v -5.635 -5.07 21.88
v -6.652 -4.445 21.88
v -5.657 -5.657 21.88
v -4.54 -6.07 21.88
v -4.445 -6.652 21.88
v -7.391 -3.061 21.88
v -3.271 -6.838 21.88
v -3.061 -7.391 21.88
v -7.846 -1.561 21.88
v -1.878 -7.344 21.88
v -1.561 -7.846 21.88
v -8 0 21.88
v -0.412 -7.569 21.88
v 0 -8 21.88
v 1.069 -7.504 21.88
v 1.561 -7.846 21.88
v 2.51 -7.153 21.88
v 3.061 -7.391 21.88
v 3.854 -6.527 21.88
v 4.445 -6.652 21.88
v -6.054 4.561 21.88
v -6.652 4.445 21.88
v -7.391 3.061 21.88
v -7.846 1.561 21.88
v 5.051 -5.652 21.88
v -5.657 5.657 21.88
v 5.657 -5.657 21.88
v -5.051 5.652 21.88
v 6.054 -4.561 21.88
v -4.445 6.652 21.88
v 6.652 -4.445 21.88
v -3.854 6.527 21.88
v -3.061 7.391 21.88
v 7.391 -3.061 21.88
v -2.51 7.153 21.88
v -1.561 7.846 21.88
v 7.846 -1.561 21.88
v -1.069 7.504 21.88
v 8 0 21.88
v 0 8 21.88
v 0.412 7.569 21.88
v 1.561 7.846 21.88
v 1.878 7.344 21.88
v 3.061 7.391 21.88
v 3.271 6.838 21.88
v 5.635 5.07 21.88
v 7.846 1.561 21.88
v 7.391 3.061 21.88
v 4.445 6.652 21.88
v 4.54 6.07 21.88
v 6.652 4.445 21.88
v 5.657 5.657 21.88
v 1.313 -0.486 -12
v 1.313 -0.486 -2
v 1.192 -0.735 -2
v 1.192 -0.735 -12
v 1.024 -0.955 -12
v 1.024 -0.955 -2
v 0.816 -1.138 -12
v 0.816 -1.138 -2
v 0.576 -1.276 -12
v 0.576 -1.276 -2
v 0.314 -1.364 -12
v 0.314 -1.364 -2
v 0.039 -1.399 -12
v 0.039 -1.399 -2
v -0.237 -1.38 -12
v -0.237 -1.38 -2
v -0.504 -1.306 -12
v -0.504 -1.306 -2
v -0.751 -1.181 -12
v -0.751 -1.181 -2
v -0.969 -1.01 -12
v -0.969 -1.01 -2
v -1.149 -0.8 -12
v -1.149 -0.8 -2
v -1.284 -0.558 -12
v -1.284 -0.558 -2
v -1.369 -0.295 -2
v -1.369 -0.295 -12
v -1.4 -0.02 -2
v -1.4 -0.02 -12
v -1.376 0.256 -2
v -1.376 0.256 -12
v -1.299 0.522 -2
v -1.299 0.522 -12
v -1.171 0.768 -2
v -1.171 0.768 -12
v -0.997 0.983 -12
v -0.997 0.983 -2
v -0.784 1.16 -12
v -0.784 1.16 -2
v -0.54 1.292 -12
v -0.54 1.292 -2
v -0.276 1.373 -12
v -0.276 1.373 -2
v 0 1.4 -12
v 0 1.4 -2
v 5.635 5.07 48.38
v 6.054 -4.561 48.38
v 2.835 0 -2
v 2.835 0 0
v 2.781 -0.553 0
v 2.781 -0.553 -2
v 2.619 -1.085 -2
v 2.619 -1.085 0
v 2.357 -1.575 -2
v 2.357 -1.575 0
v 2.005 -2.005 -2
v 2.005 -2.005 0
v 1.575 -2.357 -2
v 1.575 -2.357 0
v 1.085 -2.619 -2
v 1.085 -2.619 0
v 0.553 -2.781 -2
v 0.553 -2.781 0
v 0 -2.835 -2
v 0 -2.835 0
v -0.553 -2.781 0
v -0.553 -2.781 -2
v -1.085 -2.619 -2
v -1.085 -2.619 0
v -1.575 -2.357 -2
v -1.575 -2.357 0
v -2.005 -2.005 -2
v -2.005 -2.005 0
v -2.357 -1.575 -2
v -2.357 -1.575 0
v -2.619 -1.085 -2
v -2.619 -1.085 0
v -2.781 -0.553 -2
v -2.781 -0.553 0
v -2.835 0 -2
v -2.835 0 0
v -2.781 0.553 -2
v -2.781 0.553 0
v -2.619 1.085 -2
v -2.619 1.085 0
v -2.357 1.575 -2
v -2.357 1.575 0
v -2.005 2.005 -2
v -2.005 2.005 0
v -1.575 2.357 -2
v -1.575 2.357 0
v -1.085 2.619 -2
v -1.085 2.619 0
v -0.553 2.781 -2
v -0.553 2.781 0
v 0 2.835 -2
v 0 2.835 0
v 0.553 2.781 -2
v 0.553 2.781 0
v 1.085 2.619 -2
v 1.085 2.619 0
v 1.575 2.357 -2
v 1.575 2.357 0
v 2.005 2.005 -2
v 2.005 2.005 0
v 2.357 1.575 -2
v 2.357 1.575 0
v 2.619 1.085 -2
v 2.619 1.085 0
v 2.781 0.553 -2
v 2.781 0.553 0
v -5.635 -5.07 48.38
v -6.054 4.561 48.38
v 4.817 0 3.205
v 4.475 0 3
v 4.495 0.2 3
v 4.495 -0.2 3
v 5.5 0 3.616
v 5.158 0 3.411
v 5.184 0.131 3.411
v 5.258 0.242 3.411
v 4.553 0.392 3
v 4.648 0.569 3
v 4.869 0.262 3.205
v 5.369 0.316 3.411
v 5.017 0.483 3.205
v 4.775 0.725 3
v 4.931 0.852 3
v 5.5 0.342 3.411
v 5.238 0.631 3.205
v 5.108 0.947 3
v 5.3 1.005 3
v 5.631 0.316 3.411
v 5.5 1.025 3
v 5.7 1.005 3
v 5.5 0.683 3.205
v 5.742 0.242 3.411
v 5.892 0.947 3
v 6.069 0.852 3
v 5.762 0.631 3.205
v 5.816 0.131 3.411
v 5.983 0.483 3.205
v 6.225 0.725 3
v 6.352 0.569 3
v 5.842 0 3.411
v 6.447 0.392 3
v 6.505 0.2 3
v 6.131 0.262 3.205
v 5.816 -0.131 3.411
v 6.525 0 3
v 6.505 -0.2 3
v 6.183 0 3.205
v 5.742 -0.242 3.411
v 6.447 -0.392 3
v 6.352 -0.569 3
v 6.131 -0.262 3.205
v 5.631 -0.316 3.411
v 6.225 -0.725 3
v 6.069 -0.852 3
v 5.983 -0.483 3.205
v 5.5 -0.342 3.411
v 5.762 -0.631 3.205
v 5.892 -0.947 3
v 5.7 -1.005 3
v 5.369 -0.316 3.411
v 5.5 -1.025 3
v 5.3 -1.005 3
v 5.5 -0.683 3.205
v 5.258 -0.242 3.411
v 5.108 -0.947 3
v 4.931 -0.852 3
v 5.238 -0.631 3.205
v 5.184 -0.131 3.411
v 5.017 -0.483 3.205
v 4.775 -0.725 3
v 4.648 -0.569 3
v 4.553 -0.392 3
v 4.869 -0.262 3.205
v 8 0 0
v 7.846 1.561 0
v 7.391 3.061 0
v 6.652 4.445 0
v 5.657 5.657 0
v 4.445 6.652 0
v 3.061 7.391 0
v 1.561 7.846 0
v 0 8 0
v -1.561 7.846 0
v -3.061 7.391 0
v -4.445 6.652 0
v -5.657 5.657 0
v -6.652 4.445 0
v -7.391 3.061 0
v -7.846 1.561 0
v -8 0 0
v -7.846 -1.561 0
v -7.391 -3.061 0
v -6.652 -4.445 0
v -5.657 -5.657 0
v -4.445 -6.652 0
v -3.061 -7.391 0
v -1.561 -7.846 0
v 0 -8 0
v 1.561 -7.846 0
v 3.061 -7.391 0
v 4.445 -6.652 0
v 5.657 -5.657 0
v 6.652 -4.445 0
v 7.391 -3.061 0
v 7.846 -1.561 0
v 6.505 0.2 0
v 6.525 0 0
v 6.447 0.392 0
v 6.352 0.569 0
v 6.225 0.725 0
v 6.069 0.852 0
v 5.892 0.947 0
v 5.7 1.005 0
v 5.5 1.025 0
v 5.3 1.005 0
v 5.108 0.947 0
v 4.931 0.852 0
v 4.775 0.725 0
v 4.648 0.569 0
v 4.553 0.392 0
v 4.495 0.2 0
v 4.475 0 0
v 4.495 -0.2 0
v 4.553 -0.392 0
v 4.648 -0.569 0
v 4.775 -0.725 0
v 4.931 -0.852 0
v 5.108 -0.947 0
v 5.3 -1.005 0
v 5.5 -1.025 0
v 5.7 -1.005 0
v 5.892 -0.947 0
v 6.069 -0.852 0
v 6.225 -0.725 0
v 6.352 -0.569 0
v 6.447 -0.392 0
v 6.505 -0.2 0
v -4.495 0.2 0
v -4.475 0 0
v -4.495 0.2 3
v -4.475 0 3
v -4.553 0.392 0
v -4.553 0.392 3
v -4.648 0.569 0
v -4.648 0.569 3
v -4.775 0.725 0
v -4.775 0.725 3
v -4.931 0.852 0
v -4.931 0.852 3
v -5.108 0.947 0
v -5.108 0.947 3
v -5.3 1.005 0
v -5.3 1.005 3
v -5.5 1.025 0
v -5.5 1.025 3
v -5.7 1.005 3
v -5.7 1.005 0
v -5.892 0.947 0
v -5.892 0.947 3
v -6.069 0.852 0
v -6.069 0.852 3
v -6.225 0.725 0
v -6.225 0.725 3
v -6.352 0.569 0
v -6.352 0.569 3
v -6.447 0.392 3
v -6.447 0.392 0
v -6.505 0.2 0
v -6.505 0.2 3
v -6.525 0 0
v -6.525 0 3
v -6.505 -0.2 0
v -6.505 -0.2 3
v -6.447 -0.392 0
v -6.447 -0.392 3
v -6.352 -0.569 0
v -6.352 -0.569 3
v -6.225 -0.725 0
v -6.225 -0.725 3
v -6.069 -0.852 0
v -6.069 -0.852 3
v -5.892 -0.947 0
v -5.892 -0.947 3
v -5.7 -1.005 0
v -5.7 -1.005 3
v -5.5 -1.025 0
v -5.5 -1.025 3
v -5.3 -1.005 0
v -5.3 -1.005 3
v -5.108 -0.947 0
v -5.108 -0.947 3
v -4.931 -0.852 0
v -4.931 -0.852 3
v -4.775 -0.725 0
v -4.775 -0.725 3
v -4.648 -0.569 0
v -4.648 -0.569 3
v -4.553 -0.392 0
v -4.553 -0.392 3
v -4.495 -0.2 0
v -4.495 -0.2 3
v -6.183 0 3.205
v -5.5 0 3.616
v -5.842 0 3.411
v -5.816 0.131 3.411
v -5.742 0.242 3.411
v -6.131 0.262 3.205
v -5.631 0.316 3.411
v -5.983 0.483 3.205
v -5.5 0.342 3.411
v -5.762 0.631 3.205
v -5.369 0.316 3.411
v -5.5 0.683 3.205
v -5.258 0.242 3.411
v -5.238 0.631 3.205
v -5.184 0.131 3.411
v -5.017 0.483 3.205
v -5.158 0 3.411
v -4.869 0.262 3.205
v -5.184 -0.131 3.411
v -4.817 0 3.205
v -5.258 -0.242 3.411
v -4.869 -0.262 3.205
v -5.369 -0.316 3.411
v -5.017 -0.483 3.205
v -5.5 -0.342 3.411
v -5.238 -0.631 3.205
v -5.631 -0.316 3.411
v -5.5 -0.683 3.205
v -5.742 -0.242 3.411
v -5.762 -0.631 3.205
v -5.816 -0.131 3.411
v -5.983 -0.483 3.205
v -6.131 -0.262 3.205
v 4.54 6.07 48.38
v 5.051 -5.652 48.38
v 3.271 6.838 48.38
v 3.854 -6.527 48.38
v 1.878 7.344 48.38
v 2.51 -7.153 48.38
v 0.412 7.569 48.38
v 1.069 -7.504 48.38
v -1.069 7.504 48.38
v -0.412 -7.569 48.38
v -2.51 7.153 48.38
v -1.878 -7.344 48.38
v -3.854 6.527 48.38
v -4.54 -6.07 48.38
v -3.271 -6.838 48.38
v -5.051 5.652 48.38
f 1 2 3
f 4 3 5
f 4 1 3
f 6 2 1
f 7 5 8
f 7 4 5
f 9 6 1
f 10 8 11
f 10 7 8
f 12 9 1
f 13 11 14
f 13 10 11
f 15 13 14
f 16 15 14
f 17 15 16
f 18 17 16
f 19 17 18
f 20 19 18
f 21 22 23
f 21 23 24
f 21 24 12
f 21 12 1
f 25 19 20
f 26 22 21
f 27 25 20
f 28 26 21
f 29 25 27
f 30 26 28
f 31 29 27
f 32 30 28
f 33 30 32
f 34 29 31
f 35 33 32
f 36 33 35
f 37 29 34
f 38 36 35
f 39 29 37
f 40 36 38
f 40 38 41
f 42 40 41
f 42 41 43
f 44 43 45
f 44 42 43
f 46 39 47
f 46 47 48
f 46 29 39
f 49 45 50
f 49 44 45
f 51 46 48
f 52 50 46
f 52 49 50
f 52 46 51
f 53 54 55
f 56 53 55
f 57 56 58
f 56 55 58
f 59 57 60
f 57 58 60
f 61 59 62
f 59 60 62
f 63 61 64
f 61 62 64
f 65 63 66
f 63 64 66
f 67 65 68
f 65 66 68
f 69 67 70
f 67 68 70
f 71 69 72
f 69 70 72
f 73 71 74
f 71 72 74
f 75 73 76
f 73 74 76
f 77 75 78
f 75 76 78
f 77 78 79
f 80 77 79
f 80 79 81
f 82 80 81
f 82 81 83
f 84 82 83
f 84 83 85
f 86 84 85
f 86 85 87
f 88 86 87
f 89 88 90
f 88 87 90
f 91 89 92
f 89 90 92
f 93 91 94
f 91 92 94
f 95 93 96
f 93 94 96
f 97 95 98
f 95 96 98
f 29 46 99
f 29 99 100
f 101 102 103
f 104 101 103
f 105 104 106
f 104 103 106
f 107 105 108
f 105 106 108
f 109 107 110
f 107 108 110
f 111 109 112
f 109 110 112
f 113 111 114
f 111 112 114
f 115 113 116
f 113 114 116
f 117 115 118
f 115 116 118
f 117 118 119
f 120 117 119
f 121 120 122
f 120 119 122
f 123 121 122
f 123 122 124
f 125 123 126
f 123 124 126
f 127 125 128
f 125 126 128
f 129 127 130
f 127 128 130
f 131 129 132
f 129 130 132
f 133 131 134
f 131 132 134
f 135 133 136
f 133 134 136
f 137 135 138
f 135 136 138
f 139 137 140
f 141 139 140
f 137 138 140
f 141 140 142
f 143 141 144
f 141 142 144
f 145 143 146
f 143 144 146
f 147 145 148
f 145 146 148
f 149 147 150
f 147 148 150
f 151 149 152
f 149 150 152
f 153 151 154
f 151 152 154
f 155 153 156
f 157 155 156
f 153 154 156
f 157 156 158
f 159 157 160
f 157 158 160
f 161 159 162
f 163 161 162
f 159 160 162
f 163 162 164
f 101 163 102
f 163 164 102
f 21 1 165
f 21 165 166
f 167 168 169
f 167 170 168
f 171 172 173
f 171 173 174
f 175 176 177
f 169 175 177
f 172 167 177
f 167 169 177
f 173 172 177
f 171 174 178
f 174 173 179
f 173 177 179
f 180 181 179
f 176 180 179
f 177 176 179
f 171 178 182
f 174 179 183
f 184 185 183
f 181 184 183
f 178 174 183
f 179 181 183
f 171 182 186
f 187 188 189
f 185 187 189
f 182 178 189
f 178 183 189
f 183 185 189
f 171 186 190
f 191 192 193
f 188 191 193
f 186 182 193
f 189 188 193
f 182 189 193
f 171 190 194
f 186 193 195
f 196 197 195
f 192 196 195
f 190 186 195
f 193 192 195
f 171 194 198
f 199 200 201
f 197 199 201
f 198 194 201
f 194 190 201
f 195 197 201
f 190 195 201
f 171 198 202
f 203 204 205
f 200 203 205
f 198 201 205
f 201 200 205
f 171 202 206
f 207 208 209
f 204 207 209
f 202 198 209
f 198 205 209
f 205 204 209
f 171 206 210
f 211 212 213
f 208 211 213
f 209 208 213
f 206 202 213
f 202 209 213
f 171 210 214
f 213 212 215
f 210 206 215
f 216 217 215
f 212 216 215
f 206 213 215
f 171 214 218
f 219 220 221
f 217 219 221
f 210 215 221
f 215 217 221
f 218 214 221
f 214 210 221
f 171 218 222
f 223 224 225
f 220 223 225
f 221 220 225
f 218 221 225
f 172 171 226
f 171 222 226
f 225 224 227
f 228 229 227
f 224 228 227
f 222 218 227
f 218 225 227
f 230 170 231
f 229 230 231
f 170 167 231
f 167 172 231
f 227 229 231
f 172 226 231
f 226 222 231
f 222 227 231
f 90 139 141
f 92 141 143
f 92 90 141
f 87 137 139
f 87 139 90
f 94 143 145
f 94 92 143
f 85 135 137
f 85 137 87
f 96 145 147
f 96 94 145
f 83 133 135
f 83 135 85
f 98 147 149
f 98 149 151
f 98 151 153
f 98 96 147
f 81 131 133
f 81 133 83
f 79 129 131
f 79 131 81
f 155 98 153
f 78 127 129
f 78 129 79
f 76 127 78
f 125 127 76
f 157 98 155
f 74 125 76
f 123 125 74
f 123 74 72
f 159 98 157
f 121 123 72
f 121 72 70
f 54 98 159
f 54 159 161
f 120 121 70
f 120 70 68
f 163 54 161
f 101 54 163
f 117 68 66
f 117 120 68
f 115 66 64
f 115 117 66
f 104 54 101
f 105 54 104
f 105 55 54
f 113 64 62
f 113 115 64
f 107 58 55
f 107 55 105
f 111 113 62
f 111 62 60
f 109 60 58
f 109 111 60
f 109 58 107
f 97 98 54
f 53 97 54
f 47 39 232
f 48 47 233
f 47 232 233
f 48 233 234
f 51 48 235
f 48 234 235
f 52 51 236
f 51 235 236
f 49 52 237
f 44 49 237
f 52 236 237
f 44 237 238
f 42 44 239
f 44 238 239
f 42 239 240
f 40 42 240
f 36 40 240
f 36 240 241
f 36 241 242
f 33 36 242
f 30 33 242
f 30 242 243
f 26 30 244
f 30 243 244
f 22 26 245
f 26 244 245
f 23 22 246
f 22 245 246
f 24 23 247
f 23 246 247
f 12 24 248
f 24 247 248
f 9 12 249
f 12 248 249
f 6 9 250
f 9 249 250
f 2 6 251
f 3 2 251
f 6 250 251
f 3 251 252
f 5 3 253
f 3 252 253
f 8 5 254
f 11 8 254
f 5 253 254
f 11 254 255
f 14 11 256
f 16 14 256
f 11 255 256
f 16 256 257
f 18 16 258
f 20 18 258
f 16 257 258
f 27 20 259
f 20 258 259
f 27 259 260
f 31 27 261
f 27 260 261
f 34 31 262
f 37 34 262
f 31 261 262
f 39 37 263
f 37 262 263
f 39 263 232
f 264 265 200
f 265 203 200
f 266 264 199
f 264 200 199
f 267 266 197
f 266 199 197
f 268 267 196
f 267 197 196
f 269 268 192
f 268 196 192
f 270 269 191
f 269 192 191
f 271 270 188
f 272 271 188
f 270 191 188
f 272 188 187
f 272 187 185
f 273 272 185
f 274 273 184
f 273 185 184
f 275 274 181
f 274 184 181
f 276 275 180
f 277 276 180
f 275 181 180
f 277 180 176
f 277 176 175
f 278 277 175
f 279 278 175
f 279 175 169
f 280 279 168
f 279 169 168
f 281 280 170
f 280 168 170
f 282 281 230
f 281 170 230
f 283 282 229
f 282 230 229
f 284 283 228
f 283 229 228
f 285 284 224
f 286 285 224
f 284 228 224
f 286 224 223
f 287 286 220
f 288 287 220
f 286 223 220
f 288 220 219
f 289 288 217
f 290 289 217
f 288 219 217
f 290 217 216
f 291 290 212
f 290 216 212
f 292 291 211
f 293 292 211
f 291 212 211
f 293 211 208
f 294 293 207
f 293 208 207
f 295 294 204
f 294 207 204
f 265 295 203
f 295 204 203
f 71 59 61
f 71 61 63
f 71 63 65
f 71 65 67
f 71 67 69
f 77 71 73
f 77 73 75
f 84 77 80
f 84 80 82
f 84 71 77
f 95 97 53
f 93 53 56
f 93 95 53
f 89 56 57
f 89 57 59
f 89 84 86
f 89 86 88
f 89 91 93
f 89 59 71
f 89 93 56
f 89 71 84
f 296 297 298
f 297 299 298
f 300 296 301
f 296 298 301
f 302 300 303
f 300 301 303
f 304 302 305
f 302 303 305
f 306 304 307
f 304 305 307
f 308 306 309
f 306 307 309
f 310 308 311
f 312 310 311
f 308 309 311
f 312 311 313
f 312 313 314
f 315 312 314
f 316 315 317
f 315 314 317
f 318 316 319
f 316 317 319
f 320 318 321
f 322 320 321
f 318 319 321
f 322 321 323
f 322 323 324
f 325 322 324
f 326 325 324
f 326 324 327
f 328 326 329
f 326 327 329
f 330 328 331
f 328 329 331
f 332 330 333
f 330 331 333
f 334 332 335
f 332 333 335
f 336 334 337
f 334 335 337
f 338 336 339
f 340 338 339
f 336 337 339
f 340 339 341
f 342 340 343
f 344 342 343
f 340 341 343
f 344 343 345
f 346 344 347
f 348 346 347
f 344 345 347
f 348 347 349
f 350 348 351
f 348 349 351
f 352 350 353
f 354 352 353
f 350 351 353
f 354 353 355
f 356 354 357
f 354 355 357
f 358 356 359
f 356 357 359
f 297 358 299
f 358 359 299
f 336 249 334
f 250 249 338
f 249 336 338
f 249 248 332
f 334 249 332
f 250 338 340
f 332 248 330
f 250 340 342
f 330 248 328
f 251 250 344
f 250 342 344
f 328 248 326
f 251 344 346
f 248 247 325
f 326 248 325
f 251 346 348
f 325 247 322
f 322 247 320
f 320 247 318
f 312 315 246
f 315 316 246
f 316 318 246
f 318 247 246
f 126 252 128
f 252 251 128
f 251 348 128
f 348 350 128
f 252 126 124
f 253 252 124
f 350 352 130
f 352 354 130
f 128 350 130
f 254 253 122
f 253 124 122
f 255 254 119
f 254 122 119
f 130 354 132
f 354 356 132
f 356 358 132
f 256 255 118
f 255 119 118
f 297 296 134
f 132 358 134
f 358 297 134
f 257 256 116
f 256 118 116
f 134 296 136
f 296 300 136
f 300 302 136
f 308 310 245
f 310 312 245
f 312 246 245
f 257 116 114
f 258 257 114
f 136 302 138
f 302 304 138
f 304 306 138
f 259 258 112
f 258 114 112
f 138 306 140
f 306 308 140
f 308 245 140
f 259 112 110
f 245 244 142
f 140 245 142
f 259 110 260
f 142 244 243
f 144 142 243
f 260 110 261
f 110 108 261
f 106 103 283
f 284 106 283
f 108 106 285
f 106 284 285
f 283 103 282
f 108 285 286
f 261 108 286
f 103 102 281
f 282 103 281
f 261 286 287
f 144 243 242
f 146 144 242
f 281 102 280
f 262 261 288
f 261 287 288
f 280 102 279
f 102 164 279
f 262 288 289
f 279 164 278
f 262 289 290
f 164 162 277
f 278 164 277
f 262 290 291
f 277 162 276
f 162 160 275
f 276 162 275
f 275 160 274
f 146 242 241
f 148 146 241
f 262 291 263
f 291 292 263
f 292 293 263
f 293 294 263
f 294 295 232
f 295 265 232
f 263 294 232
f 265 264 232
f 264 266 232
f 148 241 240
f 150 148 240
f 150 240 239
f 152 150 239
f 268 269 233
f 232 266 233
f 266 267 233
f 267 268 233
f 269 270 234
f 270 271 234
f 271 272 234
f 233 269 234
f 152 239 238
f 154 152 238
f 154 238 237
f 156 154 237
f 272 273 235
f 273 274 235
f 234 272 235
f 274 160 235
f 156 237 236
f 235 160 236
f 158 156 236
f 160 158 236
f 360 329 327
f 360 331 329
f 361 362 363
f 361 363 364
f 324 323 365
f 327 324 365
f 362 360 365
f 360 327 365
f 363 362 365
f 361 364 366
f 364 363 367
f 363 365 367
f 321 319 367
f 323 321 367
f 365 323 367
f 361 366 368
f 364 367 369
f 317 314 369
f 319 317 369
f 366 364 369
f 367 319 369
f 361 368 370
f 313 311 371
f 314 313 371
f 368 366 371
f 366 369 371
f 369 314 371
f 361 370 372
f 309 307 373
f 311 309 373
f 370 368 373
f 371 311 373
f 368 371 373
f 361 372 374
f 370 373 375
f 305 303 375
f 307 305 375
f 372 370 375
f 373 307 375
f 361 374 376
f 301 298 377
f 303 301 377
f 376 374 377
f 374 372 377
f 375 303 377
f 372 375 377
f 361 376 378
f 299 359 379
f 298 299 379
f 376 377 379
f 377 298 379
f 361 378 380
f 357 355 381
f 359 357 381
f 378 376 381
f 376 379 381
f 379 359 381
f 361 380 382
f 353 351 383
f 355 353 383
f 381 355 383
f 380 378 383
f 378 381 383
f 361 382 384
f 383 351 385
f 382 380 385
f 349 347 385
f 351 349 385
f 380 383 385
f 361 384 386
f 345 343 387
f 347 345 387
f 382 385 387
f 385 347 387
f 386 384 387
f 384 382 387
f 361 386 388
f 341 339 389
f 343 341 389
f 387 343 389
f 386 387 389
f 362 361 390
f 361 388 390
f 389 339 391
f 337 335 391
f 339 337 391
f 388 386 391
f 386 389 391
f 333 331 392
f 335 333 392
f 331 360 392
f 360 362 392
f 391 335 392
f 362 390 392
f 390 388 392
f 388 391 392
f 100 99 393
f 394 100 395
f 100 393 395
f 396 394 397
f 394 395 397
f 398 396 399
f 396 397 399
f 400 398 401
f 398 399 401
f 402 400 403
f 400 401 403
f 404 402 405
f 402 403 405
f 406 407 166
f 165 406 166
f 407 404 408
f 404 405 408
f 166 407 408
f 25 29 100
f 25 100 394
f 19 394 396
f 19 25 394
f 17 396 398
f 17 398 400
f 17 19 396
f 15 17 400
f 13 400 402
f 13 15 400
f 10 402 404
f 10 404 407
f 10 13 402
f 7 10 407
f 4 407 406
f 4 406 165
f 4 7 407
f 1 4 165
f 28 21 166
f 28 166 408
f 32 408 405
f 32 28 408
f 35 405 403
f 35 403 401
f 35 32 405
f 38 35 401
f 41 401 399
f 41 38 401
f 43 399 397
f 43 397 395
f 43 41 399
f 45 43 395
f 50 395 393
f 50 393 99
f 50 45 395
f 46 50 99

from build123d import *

# Parameters (mm, degrees)
SKETCH1_R                        = 8
BOSS_EXTRUDE1_DEPTH              = 21.88
BOSS_EXTRUDE2_DEPTH              = 26.5
SKETCH3_R                        = 2.835
BOSS_EXTRUDE3_DEPTH              = 2
BOSS_EXTRUDE4_DEPTH              = 10
F_2_05_2_05_DIAMETER_HOLE1_D     = 2.05
F_2_05_2_05_DIAMETER_HOLE1_DEPTH = 3
F_2_05_2_05_DIAMETER_HOLE1_TIP   = 0.615882135


with BuildPart() as part:
    # Sketch1 → Boss-Extrude1 (new body)
    with BuildSketch(Plane.XY):
        Circle(SKETCH1_R)
    extrude(amount=BOSS_EXTRUDE1_DEPTH)

    # Sketch2 → Boss-Extrude2 (add)
    with BuildSketch(Plane.XY.offset(21.88)):
        with BuildLine():
            Line((5.634523633, 5.0703593), (6.054375133, -4.560804945))
            ThreePointArc((6.054375133, -4.560804945), (0.33012154, -7.572807918), (-5.634523633, -5.0703593))
            Line((-5.634523633, -5.0703593), (-6.054375133, 4.560804945))
            ThreePointArc((-6.054375133, 4.560804945), (-0.33012154, 7.572807918), (5.634523633, 5.0703593))
        make_face()
    extrude(amount=BOSS_EXTRUDE2_DEPTH)

    # Sketch3 → Boss-Extrude3 (add)
    with BuildSketch(Plane(origin=(0, 0, 0), x_dir=(-1, 0, 0), z_dir=(0, 0, -1))):
        with Locations(Location((0, 0, 0), (0, 0, 180))):
            Circle(SKETCH3_R)
    extrude(amount=BOSS_EXTRUDE3_DEPTH)

    # Sketch4 → Boss-Extrude4 (add)
    with BuildSketch(Plane(origin=(0, 0, -2), x_dir=(-1, 0, 0), z_dir=(0, 0, -1))):
        with BuildLine():
            Line((0, 1.4), (-1.313042891, -0.485714286))
            ThreePointArc((-1.313042891, -0.485714286), (1.148912529, -0.8), (0, 1.4))
        make_face()
    extrude(amount=BOSS_EXTRUDE4_DEPTH)

    # Ø2.05 (2.05) Diameter Hole1
    with Locations(Plane(origin=(0, 0, 0), x_dir=(-1, 0, 0), z_dir=(0, 0, -1))):
        with Locations((-5.5, 0), (5.5, 0)):
            Hole(F_2_05_2_05_DIAMETER_HOLE1_D / 2, depth=F_2_05_2_05_DIAMETER_HOLE1_DEPTH)
            with Locations((0, 0, -(F_2_05_2_05_DIAMETER_HOLE1_DEPTH + F_2_05_2_05_DIAMETER_HOLE1_TIP / 2))):  # 118° drill point
                Cone(0, F_2_05_2_05_DIAMETER_HOLE1_D / 2, F_2_05_2_05_DIAMETER_HOLE1_TIP, mode=Mode.SUBTRACT)


solid = part.part
